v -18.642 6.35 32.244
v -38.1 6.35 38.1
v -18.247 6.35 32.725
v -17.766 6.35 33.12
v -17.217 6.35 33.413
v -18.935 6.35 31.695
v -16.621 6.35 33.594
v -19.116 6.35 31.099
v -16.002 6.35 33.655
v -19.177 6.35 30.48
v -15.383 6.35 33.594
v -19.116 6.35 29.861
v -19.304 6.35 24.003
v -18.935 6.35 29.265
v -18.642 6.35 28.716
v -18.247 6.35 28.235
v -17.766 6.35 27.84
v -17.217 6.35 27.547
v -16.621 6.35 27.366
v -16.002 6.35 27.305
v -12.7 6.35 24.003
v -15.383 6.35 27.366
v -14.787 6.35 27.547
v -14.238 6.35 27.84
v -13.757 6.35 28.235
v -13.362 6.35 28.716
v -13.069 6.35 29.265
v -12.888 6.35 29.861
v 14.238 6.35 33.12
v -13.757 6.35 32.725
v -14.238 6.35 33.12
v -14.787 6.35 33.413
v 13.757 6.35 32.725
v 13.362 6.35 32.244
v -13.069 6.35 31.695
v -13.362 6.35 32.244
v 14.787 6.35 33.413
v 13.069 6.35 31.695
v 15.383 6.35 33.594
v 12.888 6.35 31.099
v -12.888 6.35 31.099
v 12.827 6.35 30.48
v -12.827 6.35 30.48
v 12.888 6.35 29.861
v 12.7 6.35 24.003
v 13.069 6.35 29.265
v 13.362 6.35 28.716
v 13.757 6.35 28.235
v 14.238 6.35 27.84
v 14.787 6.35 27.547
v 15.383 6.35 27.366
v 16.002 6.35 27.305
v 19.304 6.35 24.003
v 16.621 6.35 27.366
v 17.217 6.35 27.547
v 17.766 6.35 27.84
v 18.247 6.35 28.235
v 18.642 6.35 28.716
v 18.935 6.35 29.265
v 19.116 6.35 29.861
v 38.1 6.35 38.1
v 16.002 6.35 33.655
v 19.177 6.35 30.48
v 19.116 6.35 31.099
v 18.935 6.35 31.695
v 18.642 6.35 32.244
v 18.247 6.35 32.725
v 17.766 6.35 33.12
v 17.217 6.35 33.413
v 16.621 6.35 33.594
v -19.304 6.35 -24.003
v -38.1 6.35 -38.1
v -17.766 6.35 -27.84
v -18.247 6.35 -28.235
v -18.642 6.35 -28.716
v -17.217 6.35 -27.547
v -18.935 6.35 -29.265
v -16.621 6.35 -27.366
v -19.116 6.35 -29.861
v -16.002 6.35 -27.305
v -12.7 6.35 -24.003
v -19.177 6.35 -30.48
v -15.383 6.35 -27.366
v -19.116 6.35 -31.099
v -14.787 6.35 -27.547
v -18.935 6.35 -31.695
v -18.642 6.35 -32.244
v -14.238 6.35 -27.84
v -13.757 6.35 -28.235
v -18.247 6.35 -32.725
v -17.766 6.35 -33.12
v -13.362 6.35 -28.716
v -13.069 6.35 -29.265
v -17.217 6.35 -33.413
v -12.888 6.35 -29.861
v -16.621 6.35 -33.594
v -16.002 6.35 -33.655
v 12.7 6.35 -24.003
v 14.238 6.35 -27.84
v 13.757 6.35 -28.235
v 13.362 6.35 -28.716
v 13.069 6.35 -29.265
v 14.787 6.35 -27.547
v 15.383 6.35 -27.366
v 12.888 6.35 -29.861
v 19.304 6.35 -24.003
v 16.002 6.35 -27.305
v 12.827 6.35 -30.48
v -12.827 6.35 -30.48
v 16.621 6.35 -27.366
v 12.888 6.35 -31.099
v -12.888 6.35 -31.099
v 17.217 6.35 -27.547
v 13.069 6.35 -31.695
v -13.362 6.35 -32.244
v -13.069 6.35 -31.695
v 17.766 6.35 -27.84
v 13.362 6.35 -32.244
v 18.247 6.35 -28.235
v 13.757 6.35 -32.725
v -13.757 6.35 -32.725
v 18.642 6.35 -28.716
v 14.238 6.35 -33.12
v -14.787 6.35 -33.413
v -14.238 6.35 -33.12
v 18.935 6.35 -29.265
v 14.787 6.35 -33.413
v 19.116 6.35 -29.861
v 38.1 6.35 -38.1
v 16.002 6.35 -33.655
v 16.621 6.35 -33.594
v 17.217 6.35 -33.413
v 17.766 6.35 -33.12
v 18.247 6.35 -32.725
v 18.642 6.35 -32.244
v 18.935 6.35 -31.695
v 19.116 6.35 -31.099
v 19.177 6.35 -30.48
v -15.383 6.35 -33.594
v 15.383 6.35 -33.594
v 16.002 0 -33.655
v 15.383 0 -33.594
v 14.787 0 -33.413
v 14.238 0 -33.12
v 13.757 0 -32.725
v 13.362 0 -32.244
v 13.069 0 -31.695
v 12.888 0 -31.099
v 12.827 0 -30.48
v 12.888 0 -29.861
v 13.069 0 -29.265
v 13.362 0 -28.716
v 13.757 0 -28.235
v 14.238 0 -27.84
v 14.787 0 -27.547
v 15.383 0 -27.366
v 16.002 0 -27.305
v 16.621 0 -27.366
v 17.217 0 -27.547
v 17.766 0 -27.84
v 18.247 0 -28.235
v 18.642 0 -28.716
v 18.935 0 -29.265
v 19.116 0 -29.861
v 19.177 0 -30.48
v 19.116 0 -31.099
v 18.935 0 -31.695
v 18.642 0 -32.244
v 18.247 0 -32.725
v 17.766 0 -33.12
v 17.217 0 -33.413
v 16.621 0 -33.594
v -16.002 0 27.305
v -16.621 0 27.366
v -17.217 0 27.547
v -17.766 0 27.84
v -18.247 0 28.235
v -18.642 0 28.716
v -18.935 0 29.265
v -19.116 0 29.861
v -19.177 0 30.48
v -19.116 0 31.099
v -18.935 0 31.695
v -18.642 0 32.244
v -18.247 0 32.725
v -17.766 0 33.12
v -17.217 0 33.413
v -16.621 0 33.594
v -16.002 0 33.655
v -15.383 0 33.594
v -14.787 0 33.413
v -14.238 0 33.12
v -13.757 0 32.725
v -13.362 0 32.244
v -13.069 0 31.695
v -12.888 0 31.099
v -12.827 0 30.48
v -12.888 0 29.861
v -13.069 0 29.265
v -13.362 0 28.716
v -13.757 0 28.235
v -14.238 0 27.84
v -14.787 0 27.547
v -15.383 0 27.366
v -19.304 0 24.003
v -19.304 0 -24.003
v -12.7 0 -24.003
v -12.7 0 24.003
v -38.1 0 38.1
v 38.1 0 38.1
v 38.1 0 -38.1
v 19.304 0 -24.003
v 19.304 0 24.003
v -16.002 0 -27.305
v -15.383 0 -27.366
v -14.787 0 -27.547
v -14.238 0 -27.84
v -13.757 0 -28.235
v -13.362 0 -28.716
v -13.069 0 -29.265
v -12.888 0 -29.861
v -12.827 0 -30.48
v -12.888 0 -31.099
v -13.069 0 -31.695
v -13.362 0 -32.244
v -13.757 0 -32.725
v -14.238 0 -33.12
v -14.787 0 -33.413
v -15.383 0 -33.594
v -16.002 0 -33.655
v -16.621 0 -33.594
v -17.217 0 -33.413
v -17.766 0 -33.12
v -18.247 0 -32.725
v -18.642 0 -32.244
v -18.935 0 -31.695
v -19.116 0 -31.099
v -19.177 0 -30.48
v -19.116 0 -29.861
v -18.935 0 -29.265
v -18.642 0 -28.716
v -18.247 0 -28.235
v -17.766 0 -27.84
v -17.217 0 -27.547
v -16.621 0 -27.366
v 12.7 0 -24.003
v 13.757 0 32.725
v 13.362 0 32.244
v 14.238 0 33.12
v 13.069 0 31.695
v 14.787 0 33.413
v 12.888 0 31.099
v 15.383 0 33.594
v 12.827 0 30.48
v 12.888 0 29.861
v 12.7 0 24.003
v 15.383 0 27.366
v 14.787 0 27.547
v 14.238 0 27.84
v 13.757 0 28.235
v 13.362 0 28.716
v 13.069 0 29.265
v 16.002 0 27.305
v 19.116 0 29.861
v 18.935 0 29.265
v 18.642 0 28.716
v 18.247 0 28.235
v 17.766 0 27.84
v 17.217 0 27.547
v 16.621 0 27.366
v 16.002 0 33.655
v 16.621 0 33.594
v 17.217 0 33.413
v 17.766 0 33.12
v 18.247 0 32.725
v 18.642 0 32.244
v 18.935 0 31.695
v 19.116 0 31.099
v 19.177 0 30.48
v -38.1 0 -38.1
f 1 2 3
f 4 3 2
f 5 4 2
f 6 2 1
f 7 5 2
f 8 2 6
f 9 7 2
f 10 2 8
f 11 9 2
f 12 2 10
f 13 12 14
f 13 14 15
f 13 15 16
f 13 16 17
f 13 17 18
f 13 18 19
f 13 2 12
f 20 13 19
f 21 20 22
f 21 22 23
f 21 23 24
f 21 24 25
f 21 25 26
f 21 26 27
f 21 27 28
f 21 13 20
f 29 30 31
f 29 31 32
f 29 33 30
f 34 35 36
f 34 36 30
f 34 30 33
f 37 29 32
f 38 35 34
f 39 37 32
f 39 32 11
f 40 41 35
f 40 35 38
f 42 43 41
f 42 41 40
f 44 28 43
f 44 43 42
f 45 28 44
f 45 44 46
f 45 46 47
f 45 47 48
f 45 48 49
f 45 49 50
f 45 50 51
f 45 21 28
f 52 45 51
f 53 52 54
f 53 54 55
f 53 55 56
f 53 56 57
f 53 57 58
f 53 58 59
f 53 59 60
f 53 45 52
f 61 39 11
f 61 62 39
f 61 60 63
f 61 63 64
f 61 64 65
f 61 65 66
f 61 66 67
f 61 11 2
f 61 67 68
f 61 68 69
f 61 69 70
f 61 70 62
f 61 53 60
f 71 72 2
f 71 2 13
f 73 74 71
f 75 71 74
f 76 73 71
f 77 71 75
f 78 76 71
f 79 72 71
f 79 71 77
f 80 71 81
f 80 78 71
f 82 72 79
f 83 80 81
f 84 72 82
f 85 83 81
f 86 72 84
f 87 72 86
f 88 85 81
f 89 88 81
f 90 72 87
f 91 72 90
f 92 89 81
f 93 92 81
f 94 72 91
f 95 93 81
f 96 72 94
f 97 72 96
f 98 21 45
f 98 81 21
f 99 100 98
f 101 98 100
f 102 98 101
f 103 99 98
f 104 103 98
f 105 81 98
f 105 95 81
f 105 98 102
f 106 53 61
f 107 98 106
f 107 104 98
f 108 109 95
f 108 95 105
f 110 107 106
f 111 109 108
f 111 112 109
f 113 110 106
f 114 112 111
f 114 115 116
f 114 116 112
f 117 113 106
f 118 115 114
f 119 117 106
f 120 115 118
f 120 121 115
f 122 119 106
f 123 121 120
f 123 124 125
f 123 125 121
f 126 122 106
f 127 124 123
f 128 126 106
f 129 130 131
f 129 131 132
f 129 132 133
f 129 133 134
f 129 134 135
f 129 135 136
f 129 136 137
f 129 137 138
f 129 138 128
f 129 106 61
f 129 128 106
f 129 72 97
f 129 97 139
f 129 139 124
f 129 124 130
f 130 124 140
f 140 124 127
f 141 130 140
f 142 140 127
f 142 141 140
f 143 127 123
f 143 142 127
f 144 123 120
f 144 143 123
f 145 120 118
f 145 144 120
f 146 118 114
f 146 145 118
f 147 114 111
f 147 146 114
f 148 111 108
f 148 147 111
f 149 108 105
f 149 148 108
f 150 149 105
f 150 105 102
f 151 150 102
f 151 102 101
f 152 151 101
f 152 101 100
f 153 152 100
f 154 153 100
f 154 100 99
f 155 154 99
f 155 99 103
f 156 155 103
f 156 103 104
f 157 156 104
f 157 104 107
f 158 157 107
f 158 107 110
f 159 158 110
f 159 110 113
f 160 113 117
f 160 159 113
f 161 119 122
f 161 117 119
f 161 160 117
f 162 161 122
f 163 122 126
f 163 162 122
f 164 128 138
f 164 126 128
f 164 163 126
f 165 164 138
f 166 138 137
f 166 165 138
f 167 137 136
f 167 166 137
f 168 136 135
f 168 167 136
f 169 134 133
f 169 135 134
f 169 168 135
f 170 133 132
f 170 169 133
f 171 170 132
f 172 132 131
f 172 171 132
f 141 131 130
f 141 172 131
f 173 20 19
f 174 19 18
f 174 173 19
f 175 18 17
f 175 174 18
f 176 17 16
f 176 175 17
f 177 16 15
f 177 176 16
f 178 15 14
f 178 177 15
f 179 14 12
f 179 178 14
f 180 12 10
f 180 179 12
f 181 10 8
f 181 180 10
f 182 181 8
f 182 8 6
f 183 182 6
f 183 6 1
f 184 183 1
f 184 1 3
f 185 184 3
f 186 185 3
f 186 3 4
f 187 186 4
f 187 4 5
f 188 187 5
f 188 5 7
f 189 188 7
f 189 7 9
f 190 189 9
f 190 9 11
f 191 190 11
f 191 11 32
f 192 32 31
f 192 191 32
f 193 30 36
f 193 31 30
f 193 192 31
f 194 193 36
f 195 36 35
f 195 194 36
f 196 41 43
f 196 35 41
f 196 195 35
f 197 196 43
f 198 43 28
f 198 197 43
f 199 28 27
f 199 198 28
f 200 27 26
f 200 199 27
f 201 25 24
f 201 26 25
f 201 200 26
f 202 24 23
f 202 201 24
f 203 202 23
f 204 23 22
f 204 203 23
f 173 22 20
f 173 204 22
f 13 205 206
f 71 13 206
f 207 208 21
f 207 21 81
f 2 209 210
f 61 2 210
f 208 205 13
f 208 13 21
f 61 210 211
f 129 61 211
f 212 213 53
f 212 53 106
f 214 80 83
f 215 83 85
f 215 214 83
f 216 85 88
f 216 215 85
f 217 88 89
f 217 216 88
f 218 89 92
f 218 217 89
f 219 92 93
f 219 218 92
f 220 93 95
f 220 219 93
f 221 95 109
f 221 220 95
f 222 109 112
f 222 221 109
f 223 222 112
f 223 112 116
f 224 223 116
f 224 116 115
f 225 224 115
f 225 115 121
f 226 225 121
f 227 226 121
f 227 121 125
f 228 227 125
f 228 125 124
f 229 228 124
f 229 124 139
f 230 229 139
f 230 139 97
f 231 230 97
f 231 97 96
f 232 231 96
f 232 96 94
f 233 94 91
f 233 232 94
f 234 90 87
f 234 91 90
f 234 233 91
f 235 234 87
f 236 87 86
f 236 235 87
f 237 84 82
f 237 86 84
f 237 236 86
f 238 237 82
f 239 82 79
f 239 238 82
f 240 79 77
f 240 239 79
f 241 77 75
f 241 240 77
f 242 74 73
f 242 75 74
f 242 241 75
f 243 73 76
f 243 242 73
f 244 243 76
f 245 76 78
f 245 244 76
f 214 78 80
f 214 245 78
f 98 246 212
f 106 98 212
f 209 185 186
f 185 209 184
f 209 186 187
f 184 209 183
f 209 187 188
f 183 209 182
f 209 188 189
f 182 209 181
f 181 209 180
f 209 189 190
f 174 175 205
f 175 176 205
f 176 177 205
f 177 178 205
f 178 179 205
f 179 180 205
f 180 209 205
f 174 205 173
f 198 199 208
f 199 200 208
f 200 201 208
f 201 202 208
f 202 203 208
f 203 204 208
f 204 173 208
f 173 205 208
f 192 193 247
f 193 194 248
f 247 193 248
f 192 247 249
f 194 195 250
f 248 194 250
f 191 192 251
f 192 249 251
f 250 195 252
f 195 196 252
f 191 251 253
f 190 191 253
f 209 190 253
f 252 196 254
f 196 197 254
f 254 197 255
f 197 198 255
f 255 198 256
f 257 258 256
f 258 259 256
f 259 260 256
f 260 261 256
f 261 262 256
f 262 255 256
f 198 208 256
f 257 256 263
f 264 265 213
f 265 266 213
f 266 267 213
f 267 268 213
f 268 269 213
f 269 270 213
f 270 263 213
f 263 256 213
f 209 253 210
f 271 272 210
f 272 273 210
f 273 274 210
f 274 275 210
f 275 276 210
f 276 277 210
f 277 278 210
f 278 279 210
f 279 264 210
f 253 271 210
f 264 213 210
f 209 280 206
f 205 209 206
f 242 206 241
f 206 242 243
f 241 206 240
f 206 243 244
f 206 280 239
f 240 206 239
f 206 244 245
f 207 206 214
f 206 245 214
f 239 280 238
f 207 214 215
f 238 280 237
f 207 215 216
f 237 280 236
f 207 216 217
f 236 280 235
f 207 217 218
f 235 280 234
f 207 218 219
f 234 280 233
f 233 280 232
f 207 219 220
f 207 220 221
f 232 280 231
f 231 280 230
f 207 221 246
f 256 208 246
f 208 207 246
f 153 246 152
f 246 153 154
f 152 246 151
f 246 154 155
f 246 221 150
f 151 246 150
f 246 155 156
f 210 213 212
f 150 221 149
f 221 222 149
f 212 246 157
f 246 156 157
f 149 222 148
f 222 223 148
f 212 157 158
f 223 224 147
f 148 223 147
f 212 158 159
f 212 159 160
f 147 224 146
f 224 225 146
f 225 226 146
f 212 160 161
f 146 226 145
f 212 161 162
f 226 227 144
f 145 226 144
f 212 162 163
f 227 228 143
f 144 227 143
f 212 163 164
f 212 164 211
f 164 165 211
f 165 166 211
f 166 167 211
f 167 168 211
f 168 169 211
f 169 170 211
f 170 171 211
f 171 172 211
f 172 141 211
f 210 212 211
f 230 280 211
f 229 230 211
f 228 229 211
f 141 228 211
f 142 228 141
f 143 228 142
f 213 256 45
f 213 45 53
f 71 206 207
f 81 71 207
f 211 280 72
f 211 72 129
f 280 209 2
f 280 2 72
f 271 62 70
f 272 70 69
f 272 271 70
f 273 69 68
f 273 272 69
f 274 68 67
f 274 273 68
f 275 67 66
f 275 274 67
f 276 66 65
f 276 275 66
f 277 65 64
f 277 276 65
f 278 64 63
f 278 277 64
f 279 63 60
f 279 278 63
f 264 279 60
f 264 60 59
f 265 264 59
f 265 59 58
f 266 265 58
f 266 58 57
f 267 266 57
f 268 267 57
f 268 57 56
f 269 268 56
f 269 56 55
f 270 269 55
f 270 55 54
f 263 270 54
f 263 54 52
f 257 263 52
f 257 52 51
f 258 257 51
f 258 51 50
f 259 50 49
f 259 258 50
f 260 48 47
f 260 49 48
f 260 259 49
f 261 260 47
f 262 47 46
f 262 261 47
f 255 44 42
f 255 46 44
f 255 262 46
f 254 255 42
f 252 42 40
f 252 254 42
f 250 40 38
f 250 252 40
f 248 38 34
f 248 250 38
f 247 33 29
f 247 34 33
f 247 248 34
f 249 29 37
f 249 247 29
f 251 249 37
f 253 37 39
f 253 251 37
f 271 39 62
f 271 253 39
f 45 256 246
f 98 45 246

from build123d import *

# Parameters (mm, degrees)
SKETCH1_W           = 76.2
SKETCH1_H           = 76.2
BOSS_EXTRUDE1_DEPTH = 6.35
SKETCH2_W           = 6.604
SKETCH2_H           = 48.006
CUT_EXTRUDE1_DEPTH  = 55.254423783
SKETCH3_R           = 3.175
CUT_EXTRUDE3_DEPTH  = 55.254423783


with BuildPart() as part:
    # Sketch1 → Boss-Extrude1 (new body)
    with BuildSketch(Plane(origin=(0, 0, 0), x_dir=(1, 0, 0), z_dir=(0, 1, 0))):
        Rectangle(SKETCH1_W, SKETCH1_H)
    extrude(amount=BOSS_EXTRUDE1_DEPTH)

    # Sketch2 → Cut-Extrude1 (cut, through all)
    with BuildSketch(Plane(origin=(0, 0, 0), x_dir=(1, 0, 0), z_dir=(0, 1, 0))):
        with Locations((16.002, 0)):
            Rectangle(SKETCH2_W, SKETCH2_H)
        with Locations((-16.002, 0)):
            Rectangle(SKETCH2_W, SKETCH2_H)
    extrude(amount=CUT_EXTRUDE1_DEPTH, mode=Mode.SUBTRACT)

    # Sketch3 → Cut-Extrude3 (cut, through all)
    with BuildSketch(Plane(origin=(0, 0, 0), x_dir=(1, 0, 0), z_dir=(0, 1, 0))):
        with Locations(Location((-16.002, 30.48, 0), (0, 0, 270))):
            Circle(SKETCH3_R)
        with Locations(Location((-16.002, -30.48, 0), (0, 0, 90))):
            Circle(SKETCH3_R)
        with Locations(Location((16.002, -30.48, 0), (0, 0, 270))):
            Circle(SKETCH3_R)
        with Locations(Location((16.002, 30.48, 0), (0, 0, 90))):
            Circle(SKETCH3_R)
    extrude(amount=CUT_EXTRUDE3_DEPTH, mode=Mode.SUBTRACT)


solid = part.part
